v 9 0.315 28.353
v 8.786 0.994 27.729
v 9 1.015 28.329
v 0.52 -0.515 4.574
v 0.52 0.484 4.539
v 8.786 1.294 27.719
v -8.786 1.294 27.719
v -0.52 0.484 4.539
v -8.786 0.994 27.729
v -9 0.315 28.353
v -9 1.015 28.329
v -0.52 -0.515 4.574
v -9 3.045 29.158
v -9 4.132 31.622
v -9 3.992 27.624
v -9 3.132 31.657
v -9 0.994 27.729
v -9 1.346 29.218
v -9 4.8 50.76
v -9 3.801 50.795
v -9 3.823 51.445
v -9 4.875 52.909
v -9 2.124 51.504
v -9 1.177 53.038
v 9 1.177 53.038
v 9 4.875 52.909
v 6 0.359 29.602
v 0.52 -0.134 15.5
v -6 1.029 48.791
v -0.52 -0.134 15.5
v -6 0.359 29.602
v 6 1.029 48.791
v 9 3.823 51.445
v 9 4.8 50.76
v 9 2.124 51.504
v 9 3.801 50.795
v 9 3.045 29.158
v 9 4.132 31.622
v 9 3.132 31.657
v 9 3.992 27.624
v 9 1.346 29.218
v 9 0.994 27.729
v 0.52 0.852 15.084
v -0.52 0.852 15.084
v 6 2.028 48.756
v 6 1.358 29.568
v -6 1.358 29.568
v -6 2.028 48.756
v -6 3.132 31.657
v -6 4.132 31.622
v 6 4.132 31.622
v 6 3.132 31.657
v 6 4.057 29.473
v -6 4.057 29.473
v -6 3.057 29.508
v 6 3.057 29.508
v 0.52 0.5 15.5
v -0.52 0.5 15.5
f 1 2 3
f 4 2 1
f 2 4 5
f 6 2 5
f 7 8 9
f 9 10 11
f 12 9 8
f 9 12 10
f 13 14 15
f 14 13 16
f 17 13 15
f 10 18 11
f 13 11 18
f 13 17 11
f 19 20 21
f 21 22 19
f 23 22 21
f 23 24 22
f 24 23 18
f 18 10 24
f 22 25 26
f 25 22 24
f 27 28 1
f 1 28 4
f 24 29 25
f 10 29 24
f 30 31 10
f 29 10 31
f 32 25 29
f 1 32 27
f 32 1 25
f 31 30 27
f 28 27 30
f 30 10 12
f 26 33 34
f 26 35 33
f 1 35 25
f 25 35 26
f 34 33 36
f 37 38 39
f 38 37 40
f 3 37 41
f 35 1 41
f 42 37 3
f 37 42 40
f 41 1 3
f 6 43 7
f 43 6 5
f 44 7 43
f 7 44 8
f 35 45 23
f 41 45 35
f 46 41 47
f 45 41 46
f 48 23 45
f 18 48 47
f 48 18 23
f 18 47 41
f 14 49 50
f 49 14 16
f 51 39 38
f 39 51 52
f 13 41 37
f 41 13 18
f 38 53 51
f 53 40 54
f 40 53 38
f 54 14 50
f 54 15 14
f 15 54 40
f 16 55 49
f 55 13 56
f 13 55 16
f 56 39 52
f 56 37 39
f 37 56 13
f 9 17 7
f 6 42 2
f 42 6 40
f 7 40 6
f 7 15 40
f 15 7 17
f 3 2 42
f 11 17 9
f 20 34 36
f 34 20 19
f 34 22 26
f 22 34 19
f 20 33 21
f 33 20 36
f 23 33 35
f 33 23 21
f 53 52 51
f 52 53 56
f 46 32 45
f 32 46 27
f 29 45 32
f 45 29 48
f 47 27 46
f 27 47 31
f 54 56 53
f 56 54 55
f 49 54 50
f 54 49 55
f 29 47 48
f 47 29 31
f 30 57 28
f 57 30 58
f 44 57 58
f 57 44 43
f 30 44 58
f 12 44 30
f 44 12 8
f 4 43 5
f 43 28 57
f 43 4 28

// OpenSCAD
//Actual servo dimensions
//length: 23.5
//width: = 12.5
//height = 16

faces = 60;
caddy_thickness=2;
caddy_edges_widths=2; //Size of side left after subtracting to reduce print material/time
//servo_height=22.5; //Actual = 21, Orig=15.5 //Uncomment this for hinge
servo_height=15.5; //Actual = 21, Orig=15.5 //Uncomment this for caddy.. gotta fix this
servo_width=12.8;
servo_length=23.8;
screw_lips=4;
caddy_length=servo_length+2*caddy_edges_widths;

screw_height=9;
screw_radius=1;
screw_offset_from_edge=2;


hinge_position=6.5;
hinge_radius=2.5;
hinge_height=2;
hinge_hole_radius=0.5;

leg_length=30;
leg_width=2;
leg_end_radius=2;

hinge_thickness=2;
hinge_length=18;
hinge_servo_height = servo_height + 8;
hinge_radius_hole=hinge_radius+0.2;
hinge_radius_servo_hole=3.5;
hinge_radius_servo_screw_hole=8;
hinge_radius_servo_screw_hole_radius=0.5;
hinge_arm_length=5;

miniQuad_bodyLength = 78;

//Used for ball clip.. does not work for small implementations.
hinge_snap_hole_radius=1.2;
hinge_snap_height=2.4;
hinge_snap_hole_offset=3;

clip_length=10; //Length of the clip
clip_thickness=1; //Thickness of base of clip
clip_height=4.7; //Adjusts height of top cylinder of clip
clip_cyl_radius=1; //Radius of the top cylinder of clip
clip_tolerance=0.7; //Space either side of what the clip has to clip to.
    



//hinge_joint_perpendicular();
//hinge_joint_straight();
//hinge_leg();
//complete_caddy();

//MiniQuadraped
//Final prints
//miniQuad_base_body_bat();
//eyes_holder();
eyes_holder_top_part();
//eyes_holder_base_part();
//base_servos_clip();

//miniQuad_base_body();
//miniQuad_base_Caddies();
//hinge_on_hinge_snap_clip_perpendicular();
//miniQuad_base_body();
//hinge_leg();
//hinge_servo_pivot_clip();
//hinge_on_hinge_snap_clip_perpendicular();


//Helpers
//translate([0, miniQuad_bodyLength/2,servo_height-caddy_thickness-3])miniQuad_base_body();
//miniQuad_base_end();
//hinge();
//hinge_joint_perpendicular();
//hinge_joint_straight();
//hinge_on_hinge();

//hinge_snap_clip();


module base_servos_clip()
{
    clip_height=8; //servo_width;
    cylinder_radius=7;
    clip_thickness=1.8;
    
    difference()
    {
        helper_base_servos_clip(cylinder_radius,clip_height);
        translate([0,0,0]) cylinder(r=cylinder_radius-clip_thickness,h=clip_height, center=true, $fn=faces);
        //translate([0,2,0]) scale([0.8,0.9,1.1]) helper_base_servos_clip();
        translate([0,12,0]) cube([20,20,20], center=true);
    }
    translate([cylinder_radius-1.4,1.6,0]) cylinder(r=.4,h=clip_height, center=true, $fn=faces);
    translate([-cylinder_radius+1.4,1.6,0]) cylinder(r=.4,h=clip_height, center=true, $fn=faces);
    
    translate([cylinder_radius-1.4,1.5,0]) cube([2,1,clip_height], center=true);
    translate([-cylinder_radius+1.4,1.5,0]) cube([2,1,clip_height], center=true);
    
    translate([cylinder_radius-1,2,0]) rotate([0,0,180]) triangle(clip_height, 2);
    translate([-cylinder_radius+1,2,0]) rotate([0,0,-90]) triangle(clip_height, 2);
    
}

module triangle(extrudeHeight, sideLength)
{
    linear_extrude(height = extrudeHeight, center = true, convexity = 10)
    {
        polygon([[0,0],[sideLength,0],[0,sideLength]], convexity=10);
    }
}

module helper_base_servos_clip(cylinder_radius, clip_height)
{
    
    union()
        {
            cylinder(r=cylinder_radius,h=clip_height, center=true, $fn=faces);
            //translate([0,cylinder_radius/8,0]) cube([cylinder_radius*2,cylinder_radius/4,servo_width], center=true);
        }
}


module eyes_holder_top_part()
{
    difference()
    {
        translate([0,0,5]) eyes_holder_top();
        scale([1.04,1,1]) eyes_holder_base();
    }
}

module eyes_holder_base_part()
{
    difference()
    {
        eyes_holder_base();
        translate([0,0,9]) scale([1,1.04,1]) eyes_holder_top();
    }
}



module eyes_holder_base()
{
    
    union()
    {
        difference()
        {
            union()
            {
                hull()
                {
                    cube([1,servo_width+caddy_thickness*2+2,10], center=true);
                    translate([0,0,15]) cube([1,1,1], center=true);
                }
            }
                
                translate([0,0.6,-4]) cube([1.2,servo_width+0.7,5], center=true);  
        }
        
        translate([0,-(servo_width/2+caddy_thickness+0.5),-6.5])
        difference()
        {
            union()
            {
                cube([14,1.5,26], center=true);
                translate([0,2,-12.5]) cube([14,3,1], center=true);
            }
                
                translate([0,0,-8.5]) cube([5.8,miniQuad_bodyLength,20.03], center=true);
        }
        
       
    }
}


module eyes_holder_top()
{
     rotate([-2,0,0])
        translate([0,0,0])
        difference()
        {
            union()
            {
                hull()
                {
                    translate([0,0,35.7]) cube([18,1,24.7], center=true);
                    translate([0,0,0]) cube([1,1,1], center=true);
                }
            
                translate([0,2.7,25.5]) cube([18,1,2.5], center=true);
                translate([0,1.7,23.5]) cube([18,3,1.5], center=true);
                
                translate([0,2.7,46.8]) cube([18,1,1.8], center=true);
                translate([0,1.7,47.3]) cube([18,3,1.5], center=true);
            }
            
            translate([0,8,34.2]) cube([12,24,19.2], center=true);
        }
}


module hinge_servo_pivot_clip()
{
    sleeve_tolerance = 0.6;
    from_elbow_offset = 6;
    elbow_hook_length=4;
    from_elbow_length=hinge_length+5; 
    servo_connector_length=16;
    servo_connector_thickness=2;
    clip_thickness_override=0.8;
    clip_offset_override=0.1;
    top_thickness=0.8;
    
    difference()
    {
        union()
        {
        translate([from_elbow_length/2,0,top_thickness]) cube([from_elbow_length, servo_width, hinge_thickness+top_thickness], center=true);
        
        
        translate([0,0,-elbow_hook_length/2+hinge_thickness/2+top_thickness]) rotate([0,90,0]) cube([elbow_hook_length+top_thickness, servo_width, hinge_thickness], center=true);
         //translate([hinge_length+(clip_height-hinge_thickness)/2,servo_width/2+clip_thickness/2,hinge_servo_height/2]) 
        
            //Snap left
            translate([clip_length/2+from_elbow_offset,-servo_width/2-clip_thickness/2-clip_offset_override, -clip_height/2+hinge_thickness/2]) rotate([0,180,0]) hinge_snap_clip();
        
            
            translate([clip_length/2+from_elbow_offset,-servo_width/2-clip_thickness/2, 0.8]) rotate([0,180,0]) cube([clip_length, clip_thickness+clip_thickness_override, hinge_thickness+top_thickness], center=true);
            
            translate([clip_length/2+from_elbow_offset,-servo_width/2-clip_thickness/2-clip_thickness_override/2, -(clip_height-1.4)/2+hinge_thickness/2]) rotate([0,180,0]) cube([clip_length, clip_thickness, clip_height], center=true);
            
            
            //Snap right
        translate([clip_length/2+from_elbow_offset,servo_width/2+clip_thickness/2+clip_offset_override, -clip_height/2+hinge_thickness/2]) rotate([0,180,0]) hinge_snap_clip();
            
             translate([clip_length/2+from_elbow_offset,servo_width/2+clip_thickness/2, 0.8]) rotate([0,180,0]) cube([clip_length, clip_thickness+clip_thickness_override, hinge_thickness+top_thickness], center=true);
            
            translate([clip_length/2+from_elbow_offset,servo_width/2+clip_thickness/2+clip_thickness_override/2, -(clip_height-1.4)/2+hinge_thickness/2]) rotate([0,180,0]) cube([clip_length, clip_thickness, clip_height], center=true);
            

            
            
        }
    
        translate([from_elbow_length-servo_connector_length,0,0])
        hull()
        {
            cylinder(r=2.1, h=servo_connector_thickness, center=true, $fn=40);
            translate([servo_connector_length,0,0]) cylinder(r=3.6, h=servo_connector_thickness, center=true, $fn=40);
        }
    }
    
    //Attempt 1
//    difference()
//    {
//        cylinder(r=servo_width/2+2, h=hinge_thickness+3, $fn=faces, center=true);
//        
//        union()
//        {
//            cylinder(r=servo_width/2, h=hinge_thickness+sleeve_tolerance, $fn=faces, center=true);
//            translate([hinge_length/2,0,0]) cube([hinge_length, servo_width+sleeve_tolerance, hinge_thickness+sleeve_tolerance], center=true);
//        }
//    }
    
    
//       Original hinge arm endpoint     
//		difference()
//		{
//			union()
//			{
//				cylinder(r=servo_width/2, h=hinge_thickness, $fn=faces, center=true);
//				translate([hinge_length/2,0,0]) cube([hinge_length, servo_width, hinge_thickness], center=true);
//			}
//			cylinder(r=hinge_radius_servo_hole, h=hinge_thickness+1, $fn=faces, center=true);
//			translate([hinge_radius_servo_screw_hole,0,0]) cylinder(r=hinge_radius_servo_screw_hole_radius, h=hinge_thickness+1, $fn=faces, center=true);
//		}	         
}


module hinge_on_hinge_snap_clip_perpendicular()
{
    hinge();
     
    translate([hinge_length-(clip_height-hinge_thickness)/2,clip_thickness/2,hinge_servo_height/2-servo_width/2-clip_tolerance]) rotate([90,0,-90]) hinge_snap_clip();
    
    translate([hinge_length-(clip_height-hinge_thickness)/2,clip_thickness/2,hinge_servo_height/2+servo_width/2+clip_tolerance]) rotate([90,0,-90]) hinge_snap_clip();
}


module hinge_on_hinge_snap_clip_straight()
{
    hinge();
    //hingeFake();
    
    translate([hinge_length+(clip_height-hinge_thickness)/2,servo_width/2+clip_thickness/2,hinge_servo_height/2]) rotate([-90,90,-90]) hinge_snap_clip();
    
    translate([hinge_length+(clip_height-hinge_thickness)/2,-servo_width/2-clip_thickness/2,hinge_servo_height/2]) rotate([-90,90,-90]) hinge_snap_clip();
}

module hinge_snap_clip()
{
    
    cube([clip_length, clip_thickness, clip_height], center=true);
    translate([0, clip_cyl_radius-clip_thickness, clip_height/2]) rotate([0,90,0]) cylinder(r=1, h=clip_length, center=true, $fn=40);
}


module hinge_on_hinge_snap_ball()
{
    //Doesn't really work when small. Breaks too easily.
    difference()
    {
        //hinge();
        hingeFake();
    
        translate([hinge_length,hinge_snap_hole_offset,caddy_length/2+hinge_snap_hole_offset]) rotate([90,0,-90]) cylinder(r1=hinge_snap_hole_radius*2*.95, r2=hinge_snap_hole_radius*4, h=caddy_thickness+.5, center=true, $fn=40);
    
        translate([hinge_length,-hinge_snap_hole_offset,caddy_length/2-hinge_snap_hole_offset]) rotate([90,0,-90]) cylinder(r1=hinge_snap_hole_radius*2*.95, r2=hinge_snap_hole_radius*4, h=caddy_thickness+.5, center=true, $fn=40);
    }
     
    translate([hinge_length+hinge_snap_height+hinge_snap_hole_radius,-hinge_snap_hole_offset, caddy_length/2+hinge_snap_hole_offset]) rotate([90,0,-90]) hinge_snap_ball();
    
    translate([hinge_length+hinge_snap_height+hinge_snap_hole_radius,hinge_snap_hole_offset,caddy_length/2-hinge_snap_hole_offset]) rotate([90,0,-90]) hinge_snap_ball();
}

module hingeFake()
{translate([0,0,hinge_thickness/2])
union()
        {
		translate([hinge_length,0,hinge_servo_height/2]) cube([hinge_thickness, servo_width, (hinge_servo_height+hinge_thickness)*.65 ], center=true);

	}//union}
}

module hinge_snap_ball()
{
    //Doesn't really work when small. Breaks too easily.
    difference()
    {
        union()
        {
            translate([0,0,hinge_snap_height/2]) cylinder(r=hinge_snap_hole_radius, h=hinge_snap_height, center=true, $fn=40);
            sphere(r=hinge_snap_hole_radius*2, center=true, $fn=40);
        }
        cube([hinge_snap_hole_radius*6,hinge_snap_hole_radius/2,hinge_snap_height*2], center=true);
    }
}

module hinge_on_hinge()
{
	hinge();
    
    translate([hinge_length*2,-(servo_width),caddy_length/2-caddy_thickness/2]) rotate([90,0,180]) hinge();
}


module miniQuad_base_body_bat()
{
    gWallThickness = 0.4;
    gWallHeight = 13;
    gWallLength = 40;
    
    translate([0,0,gWallHeight/2]) cube([gWallThickness,gWallLength,gWallHeight], center=true);
    rotate([0,180,0]) miniQuad_base_body();
}

module miniQuad_base_body()
{
    //tempBodyLength=8;
    //translate([0,0,0]) cube([5.2,tempBodyLength,10.03], center=true);
    //translate([0,tempBodyLength/2,0]) miniQuad_base_end();
    
    translate([0,0,0]) cube([5,miniQuad_bodyLength,10.03], center=true);
    translate([0,miniQuad_bodyLength/2,0]) miniQuad_base_end();
    translate([0,-miniQuad_bodyLength/2,0]) miniQuad_base_end();
}


module miniQuad_base_body_type2()
{
    translate([0,0,0]) cube([5,miniQuad_bodyLength,10.03], center=true);
    translate([0,miniQuad_bodyLength/2,0]) miniQuad_base_end();
    translate([0,-miniQuad_bodyLength/2,0]) miniQuad_base_end();
}

module miniQuad_base_end()
{
   xhole=pow((pow(11,2)/2),1/2);
       
    rotate([-90,0,0]) 
    minkowski()
    {
        difference()
        {
            rotate([45,0,0]) cube([screw_lips*1.5,xhole-2,xhole-2], $fn=faces, center=true);
        
            translate([(xhole-2.2),0,0]) rotate([45,0,6]) cube([screw_lips*1.5,(xhole-2.1)*2,(xhole-2.1)*2], $fn=faces, center=true);
    
            translate([(-xhole+2.2),0,0]) rotate([45,0,-6]) cube([screw_lips*1.5,(xhole-2.1)*2,(xhole-2.1)*2], $fn=faces, center=true);
        }
            sphere(r=1, center=true, $fn=faces );
    }   
}

module miniQuad_base_Caddies()
{
    difference()
    {
        union()
        {
            translate([0,0,2.2]) cube([5.5,servo_width,4.4], center=true);
            translate([caddy_length/2+screw_lips/2+.6,0,0])  complete_caddy();
            translate([-caddy_length/2-screw_lips/2-.6,0,0]) rotate([0,0,180]) complete_caddy();
        }
        
        translate([0,0,4.4]) rotate([90,45,0]) cylinder(r=2.6, h=servo_width*2, center=true, $fn=40);
    }
}


module hinge_joint_straight()
{
	//Arm part
	translate([hinge_length +hinge_arm_length/2 ,0,hinge_servo_height/2]) cube([hinge_arm_length, servo_width, hinge_thickness], center=true);

	translate([hinge_length +hinge_arm_length/2 ,0,hinge_servo_height/2-servo_height/2+hinge_height]) cube([hinge_arm_length, servo_width, hinge_thickness], center=true);

	translate([0 ,0,-servo_height/2+hinge_height]) hinge();

	translate([hinge_length+caddy_thickness/2 + servo_length/2+hinge_arm_length, 0,0]) rotate([0,0,0]) complete_caddy();
}

module hinge_joint_perpendicular()
{
	hinge();

	translate([hinge_length+caddy_thickness/2 + servo_length/2, (servo_width)/2,caddy_length/2-caddy_thickness/2]) rotate([90,0,0]) complete_caddy();
}

module hinge_leg()
{
	complete_caddy();
	leg();
}


module hinge()
{
	//Arm part
	//translate([hinge_length +hinge_arm_length/2 ,0,hinge_servo_height/2]) cube([hinge_arm_length, servo_width, hinge_thickness], center=true);

	translate([0,0,hinge_thickness/2])
	union()
	{

		//Hinge part - Servo pivot side
		difference()
		{
			union()
			{
				cylinder(r=servo_width/2, h=hinge_thickness, $fn=faces, center=true);
				translate([hinge_length/2,0,0]) cube([hinge_length, servo_width, hinge_thickness], center=true);
			}
			cylinder(r=hinge_radius_servo_hole, h=hinge_thickness+1, $fn=faces, center=true);
			translate([hinge_radius_servo_screw_hole,0,0]) cylinder(r=hinge_radius_servo_screw_hole_radius, h=hinge_thickness+1, $fn=faces, center=true);
		}	


		//Hinge part - Artifical pivot side
		translate([0,0,hinge_servo_height])
		difference()
		{
			union()
			{
				cylinder(r=servo_width/2, h=hinge_thickness, $fn=faces, center=true);
				translate([hinge_length/2,0,0]) cube([hinge_length, servo_width, hinge_thickness], center=true);
			}
			cylinder(r=hinge_radius_hole, h=hinge_thickness+1, $fn=faces, center=true);
		
		}	

		translate([hinge_length,0,hinge_servo_height/2]) cube([hinge_thickness, servo_width, hinge_servo_height+hinge_thickness ], center=true);

	}//union


}


module complete_caddy()
{
	difference()
	{
		union()
		{
			caddy();
			hinge_point();
//			leg();
		}

		//Subtract screw holes
		translate([-servo_length/2-screw_offset_from_edge,0,screw_height/2]) cylinder(r=screw_radius, h=screw_height+1, center=true, $fn=faces);
		translate([servo_length/2+screw_offset_from_edge,0,screw_height/2]) cylinder(r=screw_radius, h=screw_height+1, center=true, $fn=faces);
				
		//Subtract Z bottom area to reduce print material and time
        translate([-servo_length*.6/2+caddy_edges_widths,0,servo_height/2]) cube([servo_length*.6-caddy_edges_widths,servo_width-caddy_edges_widths,2*servo_height], center=true, $fn=faces);


        //Subtract Y side areas to reduce print material and time
        hole= pow((pow(servo_length, 2)/2),1/2);
        translate([0,0,servo_height/4]) union()
        {
            rotate([0,-45,0]) cube([hole,2*servo_width,hole], center=true, $fn=faces);
            translate([0,0,-hole/2]) cube([servo_length,2*servo_width, hole], center=true, $fn=faces);
        }
	}
}


module caddy(){
	difference()
	{
		union()
		{
			translate([0,0,servo_height/2+caddy_thickness/2]) cube([servo_length+caddy_thickness*2, servo_width+caddy_thickness*2, servo_height+caddy_thickness], center=true, $fn=faces);

			translate([0,0,caddy_thickness*1.25]) 
			minkowski()
			{
				cube([servo_length+caddy_thickness/2, servo_width+caddy_thickness*2-screw_lips*2, caddy_thickness/2], center=true, $fn=faces);
				cylinder(r1=screw_lips, r2=0.2, h=caddy_thickness*2, center=true, $fn=faces);
			}
		}

        //Half of top hole
		translate([0,0,servo_height/2]) cube([servo_length, servo_width, servo_height+1], center=true, $fn=faces);

        //Servo wire hole	
        xhole=pow((pow(11,2)/2),1/2);
        translate([servo_length/2+caddy_thickness,0,servo_height-caddy_thickness-3]) rotate([45,0,0]) cube([servo_length*3,xhole,xhole], $fn=faces, center=true);
        
    }
}

module hinge_point()
{
	translate([servo_length/2-hinge_position,0,hinge_height/2+servo_height+caddy_thickness]) 
	difference(){
		cylinder(r=hinge_radius, h=hinge_height, $fn=faces, center=true);
		cylinder(r=hinge_hole_radius, h=hinge_height+1, $fn=faces, center=true);
	}
}


module leg()
{
	translate([-screw_lips/2-servo_length/2,0,servo_height/2+caddy_thickness/2]) 
	hull()
	{	
        //cube([screw_lips,leg_width,servo_height+caddy_thickness], center=true);
		translate([0,0,-servo_height/2+2]) cube([screw_lips,leg_width,4+caddy_thickness], center=true);
		rotate([0,0,0]) translate([-leg_length-servo_length/2+leg_end_radius,0,-servo_height/2-caddy_thickness/2+leg_width/2+leg_end_radius-1]) sphere(r=leg_end_radius, h=leg_width, center=true, $fn=faces);
    }
}
